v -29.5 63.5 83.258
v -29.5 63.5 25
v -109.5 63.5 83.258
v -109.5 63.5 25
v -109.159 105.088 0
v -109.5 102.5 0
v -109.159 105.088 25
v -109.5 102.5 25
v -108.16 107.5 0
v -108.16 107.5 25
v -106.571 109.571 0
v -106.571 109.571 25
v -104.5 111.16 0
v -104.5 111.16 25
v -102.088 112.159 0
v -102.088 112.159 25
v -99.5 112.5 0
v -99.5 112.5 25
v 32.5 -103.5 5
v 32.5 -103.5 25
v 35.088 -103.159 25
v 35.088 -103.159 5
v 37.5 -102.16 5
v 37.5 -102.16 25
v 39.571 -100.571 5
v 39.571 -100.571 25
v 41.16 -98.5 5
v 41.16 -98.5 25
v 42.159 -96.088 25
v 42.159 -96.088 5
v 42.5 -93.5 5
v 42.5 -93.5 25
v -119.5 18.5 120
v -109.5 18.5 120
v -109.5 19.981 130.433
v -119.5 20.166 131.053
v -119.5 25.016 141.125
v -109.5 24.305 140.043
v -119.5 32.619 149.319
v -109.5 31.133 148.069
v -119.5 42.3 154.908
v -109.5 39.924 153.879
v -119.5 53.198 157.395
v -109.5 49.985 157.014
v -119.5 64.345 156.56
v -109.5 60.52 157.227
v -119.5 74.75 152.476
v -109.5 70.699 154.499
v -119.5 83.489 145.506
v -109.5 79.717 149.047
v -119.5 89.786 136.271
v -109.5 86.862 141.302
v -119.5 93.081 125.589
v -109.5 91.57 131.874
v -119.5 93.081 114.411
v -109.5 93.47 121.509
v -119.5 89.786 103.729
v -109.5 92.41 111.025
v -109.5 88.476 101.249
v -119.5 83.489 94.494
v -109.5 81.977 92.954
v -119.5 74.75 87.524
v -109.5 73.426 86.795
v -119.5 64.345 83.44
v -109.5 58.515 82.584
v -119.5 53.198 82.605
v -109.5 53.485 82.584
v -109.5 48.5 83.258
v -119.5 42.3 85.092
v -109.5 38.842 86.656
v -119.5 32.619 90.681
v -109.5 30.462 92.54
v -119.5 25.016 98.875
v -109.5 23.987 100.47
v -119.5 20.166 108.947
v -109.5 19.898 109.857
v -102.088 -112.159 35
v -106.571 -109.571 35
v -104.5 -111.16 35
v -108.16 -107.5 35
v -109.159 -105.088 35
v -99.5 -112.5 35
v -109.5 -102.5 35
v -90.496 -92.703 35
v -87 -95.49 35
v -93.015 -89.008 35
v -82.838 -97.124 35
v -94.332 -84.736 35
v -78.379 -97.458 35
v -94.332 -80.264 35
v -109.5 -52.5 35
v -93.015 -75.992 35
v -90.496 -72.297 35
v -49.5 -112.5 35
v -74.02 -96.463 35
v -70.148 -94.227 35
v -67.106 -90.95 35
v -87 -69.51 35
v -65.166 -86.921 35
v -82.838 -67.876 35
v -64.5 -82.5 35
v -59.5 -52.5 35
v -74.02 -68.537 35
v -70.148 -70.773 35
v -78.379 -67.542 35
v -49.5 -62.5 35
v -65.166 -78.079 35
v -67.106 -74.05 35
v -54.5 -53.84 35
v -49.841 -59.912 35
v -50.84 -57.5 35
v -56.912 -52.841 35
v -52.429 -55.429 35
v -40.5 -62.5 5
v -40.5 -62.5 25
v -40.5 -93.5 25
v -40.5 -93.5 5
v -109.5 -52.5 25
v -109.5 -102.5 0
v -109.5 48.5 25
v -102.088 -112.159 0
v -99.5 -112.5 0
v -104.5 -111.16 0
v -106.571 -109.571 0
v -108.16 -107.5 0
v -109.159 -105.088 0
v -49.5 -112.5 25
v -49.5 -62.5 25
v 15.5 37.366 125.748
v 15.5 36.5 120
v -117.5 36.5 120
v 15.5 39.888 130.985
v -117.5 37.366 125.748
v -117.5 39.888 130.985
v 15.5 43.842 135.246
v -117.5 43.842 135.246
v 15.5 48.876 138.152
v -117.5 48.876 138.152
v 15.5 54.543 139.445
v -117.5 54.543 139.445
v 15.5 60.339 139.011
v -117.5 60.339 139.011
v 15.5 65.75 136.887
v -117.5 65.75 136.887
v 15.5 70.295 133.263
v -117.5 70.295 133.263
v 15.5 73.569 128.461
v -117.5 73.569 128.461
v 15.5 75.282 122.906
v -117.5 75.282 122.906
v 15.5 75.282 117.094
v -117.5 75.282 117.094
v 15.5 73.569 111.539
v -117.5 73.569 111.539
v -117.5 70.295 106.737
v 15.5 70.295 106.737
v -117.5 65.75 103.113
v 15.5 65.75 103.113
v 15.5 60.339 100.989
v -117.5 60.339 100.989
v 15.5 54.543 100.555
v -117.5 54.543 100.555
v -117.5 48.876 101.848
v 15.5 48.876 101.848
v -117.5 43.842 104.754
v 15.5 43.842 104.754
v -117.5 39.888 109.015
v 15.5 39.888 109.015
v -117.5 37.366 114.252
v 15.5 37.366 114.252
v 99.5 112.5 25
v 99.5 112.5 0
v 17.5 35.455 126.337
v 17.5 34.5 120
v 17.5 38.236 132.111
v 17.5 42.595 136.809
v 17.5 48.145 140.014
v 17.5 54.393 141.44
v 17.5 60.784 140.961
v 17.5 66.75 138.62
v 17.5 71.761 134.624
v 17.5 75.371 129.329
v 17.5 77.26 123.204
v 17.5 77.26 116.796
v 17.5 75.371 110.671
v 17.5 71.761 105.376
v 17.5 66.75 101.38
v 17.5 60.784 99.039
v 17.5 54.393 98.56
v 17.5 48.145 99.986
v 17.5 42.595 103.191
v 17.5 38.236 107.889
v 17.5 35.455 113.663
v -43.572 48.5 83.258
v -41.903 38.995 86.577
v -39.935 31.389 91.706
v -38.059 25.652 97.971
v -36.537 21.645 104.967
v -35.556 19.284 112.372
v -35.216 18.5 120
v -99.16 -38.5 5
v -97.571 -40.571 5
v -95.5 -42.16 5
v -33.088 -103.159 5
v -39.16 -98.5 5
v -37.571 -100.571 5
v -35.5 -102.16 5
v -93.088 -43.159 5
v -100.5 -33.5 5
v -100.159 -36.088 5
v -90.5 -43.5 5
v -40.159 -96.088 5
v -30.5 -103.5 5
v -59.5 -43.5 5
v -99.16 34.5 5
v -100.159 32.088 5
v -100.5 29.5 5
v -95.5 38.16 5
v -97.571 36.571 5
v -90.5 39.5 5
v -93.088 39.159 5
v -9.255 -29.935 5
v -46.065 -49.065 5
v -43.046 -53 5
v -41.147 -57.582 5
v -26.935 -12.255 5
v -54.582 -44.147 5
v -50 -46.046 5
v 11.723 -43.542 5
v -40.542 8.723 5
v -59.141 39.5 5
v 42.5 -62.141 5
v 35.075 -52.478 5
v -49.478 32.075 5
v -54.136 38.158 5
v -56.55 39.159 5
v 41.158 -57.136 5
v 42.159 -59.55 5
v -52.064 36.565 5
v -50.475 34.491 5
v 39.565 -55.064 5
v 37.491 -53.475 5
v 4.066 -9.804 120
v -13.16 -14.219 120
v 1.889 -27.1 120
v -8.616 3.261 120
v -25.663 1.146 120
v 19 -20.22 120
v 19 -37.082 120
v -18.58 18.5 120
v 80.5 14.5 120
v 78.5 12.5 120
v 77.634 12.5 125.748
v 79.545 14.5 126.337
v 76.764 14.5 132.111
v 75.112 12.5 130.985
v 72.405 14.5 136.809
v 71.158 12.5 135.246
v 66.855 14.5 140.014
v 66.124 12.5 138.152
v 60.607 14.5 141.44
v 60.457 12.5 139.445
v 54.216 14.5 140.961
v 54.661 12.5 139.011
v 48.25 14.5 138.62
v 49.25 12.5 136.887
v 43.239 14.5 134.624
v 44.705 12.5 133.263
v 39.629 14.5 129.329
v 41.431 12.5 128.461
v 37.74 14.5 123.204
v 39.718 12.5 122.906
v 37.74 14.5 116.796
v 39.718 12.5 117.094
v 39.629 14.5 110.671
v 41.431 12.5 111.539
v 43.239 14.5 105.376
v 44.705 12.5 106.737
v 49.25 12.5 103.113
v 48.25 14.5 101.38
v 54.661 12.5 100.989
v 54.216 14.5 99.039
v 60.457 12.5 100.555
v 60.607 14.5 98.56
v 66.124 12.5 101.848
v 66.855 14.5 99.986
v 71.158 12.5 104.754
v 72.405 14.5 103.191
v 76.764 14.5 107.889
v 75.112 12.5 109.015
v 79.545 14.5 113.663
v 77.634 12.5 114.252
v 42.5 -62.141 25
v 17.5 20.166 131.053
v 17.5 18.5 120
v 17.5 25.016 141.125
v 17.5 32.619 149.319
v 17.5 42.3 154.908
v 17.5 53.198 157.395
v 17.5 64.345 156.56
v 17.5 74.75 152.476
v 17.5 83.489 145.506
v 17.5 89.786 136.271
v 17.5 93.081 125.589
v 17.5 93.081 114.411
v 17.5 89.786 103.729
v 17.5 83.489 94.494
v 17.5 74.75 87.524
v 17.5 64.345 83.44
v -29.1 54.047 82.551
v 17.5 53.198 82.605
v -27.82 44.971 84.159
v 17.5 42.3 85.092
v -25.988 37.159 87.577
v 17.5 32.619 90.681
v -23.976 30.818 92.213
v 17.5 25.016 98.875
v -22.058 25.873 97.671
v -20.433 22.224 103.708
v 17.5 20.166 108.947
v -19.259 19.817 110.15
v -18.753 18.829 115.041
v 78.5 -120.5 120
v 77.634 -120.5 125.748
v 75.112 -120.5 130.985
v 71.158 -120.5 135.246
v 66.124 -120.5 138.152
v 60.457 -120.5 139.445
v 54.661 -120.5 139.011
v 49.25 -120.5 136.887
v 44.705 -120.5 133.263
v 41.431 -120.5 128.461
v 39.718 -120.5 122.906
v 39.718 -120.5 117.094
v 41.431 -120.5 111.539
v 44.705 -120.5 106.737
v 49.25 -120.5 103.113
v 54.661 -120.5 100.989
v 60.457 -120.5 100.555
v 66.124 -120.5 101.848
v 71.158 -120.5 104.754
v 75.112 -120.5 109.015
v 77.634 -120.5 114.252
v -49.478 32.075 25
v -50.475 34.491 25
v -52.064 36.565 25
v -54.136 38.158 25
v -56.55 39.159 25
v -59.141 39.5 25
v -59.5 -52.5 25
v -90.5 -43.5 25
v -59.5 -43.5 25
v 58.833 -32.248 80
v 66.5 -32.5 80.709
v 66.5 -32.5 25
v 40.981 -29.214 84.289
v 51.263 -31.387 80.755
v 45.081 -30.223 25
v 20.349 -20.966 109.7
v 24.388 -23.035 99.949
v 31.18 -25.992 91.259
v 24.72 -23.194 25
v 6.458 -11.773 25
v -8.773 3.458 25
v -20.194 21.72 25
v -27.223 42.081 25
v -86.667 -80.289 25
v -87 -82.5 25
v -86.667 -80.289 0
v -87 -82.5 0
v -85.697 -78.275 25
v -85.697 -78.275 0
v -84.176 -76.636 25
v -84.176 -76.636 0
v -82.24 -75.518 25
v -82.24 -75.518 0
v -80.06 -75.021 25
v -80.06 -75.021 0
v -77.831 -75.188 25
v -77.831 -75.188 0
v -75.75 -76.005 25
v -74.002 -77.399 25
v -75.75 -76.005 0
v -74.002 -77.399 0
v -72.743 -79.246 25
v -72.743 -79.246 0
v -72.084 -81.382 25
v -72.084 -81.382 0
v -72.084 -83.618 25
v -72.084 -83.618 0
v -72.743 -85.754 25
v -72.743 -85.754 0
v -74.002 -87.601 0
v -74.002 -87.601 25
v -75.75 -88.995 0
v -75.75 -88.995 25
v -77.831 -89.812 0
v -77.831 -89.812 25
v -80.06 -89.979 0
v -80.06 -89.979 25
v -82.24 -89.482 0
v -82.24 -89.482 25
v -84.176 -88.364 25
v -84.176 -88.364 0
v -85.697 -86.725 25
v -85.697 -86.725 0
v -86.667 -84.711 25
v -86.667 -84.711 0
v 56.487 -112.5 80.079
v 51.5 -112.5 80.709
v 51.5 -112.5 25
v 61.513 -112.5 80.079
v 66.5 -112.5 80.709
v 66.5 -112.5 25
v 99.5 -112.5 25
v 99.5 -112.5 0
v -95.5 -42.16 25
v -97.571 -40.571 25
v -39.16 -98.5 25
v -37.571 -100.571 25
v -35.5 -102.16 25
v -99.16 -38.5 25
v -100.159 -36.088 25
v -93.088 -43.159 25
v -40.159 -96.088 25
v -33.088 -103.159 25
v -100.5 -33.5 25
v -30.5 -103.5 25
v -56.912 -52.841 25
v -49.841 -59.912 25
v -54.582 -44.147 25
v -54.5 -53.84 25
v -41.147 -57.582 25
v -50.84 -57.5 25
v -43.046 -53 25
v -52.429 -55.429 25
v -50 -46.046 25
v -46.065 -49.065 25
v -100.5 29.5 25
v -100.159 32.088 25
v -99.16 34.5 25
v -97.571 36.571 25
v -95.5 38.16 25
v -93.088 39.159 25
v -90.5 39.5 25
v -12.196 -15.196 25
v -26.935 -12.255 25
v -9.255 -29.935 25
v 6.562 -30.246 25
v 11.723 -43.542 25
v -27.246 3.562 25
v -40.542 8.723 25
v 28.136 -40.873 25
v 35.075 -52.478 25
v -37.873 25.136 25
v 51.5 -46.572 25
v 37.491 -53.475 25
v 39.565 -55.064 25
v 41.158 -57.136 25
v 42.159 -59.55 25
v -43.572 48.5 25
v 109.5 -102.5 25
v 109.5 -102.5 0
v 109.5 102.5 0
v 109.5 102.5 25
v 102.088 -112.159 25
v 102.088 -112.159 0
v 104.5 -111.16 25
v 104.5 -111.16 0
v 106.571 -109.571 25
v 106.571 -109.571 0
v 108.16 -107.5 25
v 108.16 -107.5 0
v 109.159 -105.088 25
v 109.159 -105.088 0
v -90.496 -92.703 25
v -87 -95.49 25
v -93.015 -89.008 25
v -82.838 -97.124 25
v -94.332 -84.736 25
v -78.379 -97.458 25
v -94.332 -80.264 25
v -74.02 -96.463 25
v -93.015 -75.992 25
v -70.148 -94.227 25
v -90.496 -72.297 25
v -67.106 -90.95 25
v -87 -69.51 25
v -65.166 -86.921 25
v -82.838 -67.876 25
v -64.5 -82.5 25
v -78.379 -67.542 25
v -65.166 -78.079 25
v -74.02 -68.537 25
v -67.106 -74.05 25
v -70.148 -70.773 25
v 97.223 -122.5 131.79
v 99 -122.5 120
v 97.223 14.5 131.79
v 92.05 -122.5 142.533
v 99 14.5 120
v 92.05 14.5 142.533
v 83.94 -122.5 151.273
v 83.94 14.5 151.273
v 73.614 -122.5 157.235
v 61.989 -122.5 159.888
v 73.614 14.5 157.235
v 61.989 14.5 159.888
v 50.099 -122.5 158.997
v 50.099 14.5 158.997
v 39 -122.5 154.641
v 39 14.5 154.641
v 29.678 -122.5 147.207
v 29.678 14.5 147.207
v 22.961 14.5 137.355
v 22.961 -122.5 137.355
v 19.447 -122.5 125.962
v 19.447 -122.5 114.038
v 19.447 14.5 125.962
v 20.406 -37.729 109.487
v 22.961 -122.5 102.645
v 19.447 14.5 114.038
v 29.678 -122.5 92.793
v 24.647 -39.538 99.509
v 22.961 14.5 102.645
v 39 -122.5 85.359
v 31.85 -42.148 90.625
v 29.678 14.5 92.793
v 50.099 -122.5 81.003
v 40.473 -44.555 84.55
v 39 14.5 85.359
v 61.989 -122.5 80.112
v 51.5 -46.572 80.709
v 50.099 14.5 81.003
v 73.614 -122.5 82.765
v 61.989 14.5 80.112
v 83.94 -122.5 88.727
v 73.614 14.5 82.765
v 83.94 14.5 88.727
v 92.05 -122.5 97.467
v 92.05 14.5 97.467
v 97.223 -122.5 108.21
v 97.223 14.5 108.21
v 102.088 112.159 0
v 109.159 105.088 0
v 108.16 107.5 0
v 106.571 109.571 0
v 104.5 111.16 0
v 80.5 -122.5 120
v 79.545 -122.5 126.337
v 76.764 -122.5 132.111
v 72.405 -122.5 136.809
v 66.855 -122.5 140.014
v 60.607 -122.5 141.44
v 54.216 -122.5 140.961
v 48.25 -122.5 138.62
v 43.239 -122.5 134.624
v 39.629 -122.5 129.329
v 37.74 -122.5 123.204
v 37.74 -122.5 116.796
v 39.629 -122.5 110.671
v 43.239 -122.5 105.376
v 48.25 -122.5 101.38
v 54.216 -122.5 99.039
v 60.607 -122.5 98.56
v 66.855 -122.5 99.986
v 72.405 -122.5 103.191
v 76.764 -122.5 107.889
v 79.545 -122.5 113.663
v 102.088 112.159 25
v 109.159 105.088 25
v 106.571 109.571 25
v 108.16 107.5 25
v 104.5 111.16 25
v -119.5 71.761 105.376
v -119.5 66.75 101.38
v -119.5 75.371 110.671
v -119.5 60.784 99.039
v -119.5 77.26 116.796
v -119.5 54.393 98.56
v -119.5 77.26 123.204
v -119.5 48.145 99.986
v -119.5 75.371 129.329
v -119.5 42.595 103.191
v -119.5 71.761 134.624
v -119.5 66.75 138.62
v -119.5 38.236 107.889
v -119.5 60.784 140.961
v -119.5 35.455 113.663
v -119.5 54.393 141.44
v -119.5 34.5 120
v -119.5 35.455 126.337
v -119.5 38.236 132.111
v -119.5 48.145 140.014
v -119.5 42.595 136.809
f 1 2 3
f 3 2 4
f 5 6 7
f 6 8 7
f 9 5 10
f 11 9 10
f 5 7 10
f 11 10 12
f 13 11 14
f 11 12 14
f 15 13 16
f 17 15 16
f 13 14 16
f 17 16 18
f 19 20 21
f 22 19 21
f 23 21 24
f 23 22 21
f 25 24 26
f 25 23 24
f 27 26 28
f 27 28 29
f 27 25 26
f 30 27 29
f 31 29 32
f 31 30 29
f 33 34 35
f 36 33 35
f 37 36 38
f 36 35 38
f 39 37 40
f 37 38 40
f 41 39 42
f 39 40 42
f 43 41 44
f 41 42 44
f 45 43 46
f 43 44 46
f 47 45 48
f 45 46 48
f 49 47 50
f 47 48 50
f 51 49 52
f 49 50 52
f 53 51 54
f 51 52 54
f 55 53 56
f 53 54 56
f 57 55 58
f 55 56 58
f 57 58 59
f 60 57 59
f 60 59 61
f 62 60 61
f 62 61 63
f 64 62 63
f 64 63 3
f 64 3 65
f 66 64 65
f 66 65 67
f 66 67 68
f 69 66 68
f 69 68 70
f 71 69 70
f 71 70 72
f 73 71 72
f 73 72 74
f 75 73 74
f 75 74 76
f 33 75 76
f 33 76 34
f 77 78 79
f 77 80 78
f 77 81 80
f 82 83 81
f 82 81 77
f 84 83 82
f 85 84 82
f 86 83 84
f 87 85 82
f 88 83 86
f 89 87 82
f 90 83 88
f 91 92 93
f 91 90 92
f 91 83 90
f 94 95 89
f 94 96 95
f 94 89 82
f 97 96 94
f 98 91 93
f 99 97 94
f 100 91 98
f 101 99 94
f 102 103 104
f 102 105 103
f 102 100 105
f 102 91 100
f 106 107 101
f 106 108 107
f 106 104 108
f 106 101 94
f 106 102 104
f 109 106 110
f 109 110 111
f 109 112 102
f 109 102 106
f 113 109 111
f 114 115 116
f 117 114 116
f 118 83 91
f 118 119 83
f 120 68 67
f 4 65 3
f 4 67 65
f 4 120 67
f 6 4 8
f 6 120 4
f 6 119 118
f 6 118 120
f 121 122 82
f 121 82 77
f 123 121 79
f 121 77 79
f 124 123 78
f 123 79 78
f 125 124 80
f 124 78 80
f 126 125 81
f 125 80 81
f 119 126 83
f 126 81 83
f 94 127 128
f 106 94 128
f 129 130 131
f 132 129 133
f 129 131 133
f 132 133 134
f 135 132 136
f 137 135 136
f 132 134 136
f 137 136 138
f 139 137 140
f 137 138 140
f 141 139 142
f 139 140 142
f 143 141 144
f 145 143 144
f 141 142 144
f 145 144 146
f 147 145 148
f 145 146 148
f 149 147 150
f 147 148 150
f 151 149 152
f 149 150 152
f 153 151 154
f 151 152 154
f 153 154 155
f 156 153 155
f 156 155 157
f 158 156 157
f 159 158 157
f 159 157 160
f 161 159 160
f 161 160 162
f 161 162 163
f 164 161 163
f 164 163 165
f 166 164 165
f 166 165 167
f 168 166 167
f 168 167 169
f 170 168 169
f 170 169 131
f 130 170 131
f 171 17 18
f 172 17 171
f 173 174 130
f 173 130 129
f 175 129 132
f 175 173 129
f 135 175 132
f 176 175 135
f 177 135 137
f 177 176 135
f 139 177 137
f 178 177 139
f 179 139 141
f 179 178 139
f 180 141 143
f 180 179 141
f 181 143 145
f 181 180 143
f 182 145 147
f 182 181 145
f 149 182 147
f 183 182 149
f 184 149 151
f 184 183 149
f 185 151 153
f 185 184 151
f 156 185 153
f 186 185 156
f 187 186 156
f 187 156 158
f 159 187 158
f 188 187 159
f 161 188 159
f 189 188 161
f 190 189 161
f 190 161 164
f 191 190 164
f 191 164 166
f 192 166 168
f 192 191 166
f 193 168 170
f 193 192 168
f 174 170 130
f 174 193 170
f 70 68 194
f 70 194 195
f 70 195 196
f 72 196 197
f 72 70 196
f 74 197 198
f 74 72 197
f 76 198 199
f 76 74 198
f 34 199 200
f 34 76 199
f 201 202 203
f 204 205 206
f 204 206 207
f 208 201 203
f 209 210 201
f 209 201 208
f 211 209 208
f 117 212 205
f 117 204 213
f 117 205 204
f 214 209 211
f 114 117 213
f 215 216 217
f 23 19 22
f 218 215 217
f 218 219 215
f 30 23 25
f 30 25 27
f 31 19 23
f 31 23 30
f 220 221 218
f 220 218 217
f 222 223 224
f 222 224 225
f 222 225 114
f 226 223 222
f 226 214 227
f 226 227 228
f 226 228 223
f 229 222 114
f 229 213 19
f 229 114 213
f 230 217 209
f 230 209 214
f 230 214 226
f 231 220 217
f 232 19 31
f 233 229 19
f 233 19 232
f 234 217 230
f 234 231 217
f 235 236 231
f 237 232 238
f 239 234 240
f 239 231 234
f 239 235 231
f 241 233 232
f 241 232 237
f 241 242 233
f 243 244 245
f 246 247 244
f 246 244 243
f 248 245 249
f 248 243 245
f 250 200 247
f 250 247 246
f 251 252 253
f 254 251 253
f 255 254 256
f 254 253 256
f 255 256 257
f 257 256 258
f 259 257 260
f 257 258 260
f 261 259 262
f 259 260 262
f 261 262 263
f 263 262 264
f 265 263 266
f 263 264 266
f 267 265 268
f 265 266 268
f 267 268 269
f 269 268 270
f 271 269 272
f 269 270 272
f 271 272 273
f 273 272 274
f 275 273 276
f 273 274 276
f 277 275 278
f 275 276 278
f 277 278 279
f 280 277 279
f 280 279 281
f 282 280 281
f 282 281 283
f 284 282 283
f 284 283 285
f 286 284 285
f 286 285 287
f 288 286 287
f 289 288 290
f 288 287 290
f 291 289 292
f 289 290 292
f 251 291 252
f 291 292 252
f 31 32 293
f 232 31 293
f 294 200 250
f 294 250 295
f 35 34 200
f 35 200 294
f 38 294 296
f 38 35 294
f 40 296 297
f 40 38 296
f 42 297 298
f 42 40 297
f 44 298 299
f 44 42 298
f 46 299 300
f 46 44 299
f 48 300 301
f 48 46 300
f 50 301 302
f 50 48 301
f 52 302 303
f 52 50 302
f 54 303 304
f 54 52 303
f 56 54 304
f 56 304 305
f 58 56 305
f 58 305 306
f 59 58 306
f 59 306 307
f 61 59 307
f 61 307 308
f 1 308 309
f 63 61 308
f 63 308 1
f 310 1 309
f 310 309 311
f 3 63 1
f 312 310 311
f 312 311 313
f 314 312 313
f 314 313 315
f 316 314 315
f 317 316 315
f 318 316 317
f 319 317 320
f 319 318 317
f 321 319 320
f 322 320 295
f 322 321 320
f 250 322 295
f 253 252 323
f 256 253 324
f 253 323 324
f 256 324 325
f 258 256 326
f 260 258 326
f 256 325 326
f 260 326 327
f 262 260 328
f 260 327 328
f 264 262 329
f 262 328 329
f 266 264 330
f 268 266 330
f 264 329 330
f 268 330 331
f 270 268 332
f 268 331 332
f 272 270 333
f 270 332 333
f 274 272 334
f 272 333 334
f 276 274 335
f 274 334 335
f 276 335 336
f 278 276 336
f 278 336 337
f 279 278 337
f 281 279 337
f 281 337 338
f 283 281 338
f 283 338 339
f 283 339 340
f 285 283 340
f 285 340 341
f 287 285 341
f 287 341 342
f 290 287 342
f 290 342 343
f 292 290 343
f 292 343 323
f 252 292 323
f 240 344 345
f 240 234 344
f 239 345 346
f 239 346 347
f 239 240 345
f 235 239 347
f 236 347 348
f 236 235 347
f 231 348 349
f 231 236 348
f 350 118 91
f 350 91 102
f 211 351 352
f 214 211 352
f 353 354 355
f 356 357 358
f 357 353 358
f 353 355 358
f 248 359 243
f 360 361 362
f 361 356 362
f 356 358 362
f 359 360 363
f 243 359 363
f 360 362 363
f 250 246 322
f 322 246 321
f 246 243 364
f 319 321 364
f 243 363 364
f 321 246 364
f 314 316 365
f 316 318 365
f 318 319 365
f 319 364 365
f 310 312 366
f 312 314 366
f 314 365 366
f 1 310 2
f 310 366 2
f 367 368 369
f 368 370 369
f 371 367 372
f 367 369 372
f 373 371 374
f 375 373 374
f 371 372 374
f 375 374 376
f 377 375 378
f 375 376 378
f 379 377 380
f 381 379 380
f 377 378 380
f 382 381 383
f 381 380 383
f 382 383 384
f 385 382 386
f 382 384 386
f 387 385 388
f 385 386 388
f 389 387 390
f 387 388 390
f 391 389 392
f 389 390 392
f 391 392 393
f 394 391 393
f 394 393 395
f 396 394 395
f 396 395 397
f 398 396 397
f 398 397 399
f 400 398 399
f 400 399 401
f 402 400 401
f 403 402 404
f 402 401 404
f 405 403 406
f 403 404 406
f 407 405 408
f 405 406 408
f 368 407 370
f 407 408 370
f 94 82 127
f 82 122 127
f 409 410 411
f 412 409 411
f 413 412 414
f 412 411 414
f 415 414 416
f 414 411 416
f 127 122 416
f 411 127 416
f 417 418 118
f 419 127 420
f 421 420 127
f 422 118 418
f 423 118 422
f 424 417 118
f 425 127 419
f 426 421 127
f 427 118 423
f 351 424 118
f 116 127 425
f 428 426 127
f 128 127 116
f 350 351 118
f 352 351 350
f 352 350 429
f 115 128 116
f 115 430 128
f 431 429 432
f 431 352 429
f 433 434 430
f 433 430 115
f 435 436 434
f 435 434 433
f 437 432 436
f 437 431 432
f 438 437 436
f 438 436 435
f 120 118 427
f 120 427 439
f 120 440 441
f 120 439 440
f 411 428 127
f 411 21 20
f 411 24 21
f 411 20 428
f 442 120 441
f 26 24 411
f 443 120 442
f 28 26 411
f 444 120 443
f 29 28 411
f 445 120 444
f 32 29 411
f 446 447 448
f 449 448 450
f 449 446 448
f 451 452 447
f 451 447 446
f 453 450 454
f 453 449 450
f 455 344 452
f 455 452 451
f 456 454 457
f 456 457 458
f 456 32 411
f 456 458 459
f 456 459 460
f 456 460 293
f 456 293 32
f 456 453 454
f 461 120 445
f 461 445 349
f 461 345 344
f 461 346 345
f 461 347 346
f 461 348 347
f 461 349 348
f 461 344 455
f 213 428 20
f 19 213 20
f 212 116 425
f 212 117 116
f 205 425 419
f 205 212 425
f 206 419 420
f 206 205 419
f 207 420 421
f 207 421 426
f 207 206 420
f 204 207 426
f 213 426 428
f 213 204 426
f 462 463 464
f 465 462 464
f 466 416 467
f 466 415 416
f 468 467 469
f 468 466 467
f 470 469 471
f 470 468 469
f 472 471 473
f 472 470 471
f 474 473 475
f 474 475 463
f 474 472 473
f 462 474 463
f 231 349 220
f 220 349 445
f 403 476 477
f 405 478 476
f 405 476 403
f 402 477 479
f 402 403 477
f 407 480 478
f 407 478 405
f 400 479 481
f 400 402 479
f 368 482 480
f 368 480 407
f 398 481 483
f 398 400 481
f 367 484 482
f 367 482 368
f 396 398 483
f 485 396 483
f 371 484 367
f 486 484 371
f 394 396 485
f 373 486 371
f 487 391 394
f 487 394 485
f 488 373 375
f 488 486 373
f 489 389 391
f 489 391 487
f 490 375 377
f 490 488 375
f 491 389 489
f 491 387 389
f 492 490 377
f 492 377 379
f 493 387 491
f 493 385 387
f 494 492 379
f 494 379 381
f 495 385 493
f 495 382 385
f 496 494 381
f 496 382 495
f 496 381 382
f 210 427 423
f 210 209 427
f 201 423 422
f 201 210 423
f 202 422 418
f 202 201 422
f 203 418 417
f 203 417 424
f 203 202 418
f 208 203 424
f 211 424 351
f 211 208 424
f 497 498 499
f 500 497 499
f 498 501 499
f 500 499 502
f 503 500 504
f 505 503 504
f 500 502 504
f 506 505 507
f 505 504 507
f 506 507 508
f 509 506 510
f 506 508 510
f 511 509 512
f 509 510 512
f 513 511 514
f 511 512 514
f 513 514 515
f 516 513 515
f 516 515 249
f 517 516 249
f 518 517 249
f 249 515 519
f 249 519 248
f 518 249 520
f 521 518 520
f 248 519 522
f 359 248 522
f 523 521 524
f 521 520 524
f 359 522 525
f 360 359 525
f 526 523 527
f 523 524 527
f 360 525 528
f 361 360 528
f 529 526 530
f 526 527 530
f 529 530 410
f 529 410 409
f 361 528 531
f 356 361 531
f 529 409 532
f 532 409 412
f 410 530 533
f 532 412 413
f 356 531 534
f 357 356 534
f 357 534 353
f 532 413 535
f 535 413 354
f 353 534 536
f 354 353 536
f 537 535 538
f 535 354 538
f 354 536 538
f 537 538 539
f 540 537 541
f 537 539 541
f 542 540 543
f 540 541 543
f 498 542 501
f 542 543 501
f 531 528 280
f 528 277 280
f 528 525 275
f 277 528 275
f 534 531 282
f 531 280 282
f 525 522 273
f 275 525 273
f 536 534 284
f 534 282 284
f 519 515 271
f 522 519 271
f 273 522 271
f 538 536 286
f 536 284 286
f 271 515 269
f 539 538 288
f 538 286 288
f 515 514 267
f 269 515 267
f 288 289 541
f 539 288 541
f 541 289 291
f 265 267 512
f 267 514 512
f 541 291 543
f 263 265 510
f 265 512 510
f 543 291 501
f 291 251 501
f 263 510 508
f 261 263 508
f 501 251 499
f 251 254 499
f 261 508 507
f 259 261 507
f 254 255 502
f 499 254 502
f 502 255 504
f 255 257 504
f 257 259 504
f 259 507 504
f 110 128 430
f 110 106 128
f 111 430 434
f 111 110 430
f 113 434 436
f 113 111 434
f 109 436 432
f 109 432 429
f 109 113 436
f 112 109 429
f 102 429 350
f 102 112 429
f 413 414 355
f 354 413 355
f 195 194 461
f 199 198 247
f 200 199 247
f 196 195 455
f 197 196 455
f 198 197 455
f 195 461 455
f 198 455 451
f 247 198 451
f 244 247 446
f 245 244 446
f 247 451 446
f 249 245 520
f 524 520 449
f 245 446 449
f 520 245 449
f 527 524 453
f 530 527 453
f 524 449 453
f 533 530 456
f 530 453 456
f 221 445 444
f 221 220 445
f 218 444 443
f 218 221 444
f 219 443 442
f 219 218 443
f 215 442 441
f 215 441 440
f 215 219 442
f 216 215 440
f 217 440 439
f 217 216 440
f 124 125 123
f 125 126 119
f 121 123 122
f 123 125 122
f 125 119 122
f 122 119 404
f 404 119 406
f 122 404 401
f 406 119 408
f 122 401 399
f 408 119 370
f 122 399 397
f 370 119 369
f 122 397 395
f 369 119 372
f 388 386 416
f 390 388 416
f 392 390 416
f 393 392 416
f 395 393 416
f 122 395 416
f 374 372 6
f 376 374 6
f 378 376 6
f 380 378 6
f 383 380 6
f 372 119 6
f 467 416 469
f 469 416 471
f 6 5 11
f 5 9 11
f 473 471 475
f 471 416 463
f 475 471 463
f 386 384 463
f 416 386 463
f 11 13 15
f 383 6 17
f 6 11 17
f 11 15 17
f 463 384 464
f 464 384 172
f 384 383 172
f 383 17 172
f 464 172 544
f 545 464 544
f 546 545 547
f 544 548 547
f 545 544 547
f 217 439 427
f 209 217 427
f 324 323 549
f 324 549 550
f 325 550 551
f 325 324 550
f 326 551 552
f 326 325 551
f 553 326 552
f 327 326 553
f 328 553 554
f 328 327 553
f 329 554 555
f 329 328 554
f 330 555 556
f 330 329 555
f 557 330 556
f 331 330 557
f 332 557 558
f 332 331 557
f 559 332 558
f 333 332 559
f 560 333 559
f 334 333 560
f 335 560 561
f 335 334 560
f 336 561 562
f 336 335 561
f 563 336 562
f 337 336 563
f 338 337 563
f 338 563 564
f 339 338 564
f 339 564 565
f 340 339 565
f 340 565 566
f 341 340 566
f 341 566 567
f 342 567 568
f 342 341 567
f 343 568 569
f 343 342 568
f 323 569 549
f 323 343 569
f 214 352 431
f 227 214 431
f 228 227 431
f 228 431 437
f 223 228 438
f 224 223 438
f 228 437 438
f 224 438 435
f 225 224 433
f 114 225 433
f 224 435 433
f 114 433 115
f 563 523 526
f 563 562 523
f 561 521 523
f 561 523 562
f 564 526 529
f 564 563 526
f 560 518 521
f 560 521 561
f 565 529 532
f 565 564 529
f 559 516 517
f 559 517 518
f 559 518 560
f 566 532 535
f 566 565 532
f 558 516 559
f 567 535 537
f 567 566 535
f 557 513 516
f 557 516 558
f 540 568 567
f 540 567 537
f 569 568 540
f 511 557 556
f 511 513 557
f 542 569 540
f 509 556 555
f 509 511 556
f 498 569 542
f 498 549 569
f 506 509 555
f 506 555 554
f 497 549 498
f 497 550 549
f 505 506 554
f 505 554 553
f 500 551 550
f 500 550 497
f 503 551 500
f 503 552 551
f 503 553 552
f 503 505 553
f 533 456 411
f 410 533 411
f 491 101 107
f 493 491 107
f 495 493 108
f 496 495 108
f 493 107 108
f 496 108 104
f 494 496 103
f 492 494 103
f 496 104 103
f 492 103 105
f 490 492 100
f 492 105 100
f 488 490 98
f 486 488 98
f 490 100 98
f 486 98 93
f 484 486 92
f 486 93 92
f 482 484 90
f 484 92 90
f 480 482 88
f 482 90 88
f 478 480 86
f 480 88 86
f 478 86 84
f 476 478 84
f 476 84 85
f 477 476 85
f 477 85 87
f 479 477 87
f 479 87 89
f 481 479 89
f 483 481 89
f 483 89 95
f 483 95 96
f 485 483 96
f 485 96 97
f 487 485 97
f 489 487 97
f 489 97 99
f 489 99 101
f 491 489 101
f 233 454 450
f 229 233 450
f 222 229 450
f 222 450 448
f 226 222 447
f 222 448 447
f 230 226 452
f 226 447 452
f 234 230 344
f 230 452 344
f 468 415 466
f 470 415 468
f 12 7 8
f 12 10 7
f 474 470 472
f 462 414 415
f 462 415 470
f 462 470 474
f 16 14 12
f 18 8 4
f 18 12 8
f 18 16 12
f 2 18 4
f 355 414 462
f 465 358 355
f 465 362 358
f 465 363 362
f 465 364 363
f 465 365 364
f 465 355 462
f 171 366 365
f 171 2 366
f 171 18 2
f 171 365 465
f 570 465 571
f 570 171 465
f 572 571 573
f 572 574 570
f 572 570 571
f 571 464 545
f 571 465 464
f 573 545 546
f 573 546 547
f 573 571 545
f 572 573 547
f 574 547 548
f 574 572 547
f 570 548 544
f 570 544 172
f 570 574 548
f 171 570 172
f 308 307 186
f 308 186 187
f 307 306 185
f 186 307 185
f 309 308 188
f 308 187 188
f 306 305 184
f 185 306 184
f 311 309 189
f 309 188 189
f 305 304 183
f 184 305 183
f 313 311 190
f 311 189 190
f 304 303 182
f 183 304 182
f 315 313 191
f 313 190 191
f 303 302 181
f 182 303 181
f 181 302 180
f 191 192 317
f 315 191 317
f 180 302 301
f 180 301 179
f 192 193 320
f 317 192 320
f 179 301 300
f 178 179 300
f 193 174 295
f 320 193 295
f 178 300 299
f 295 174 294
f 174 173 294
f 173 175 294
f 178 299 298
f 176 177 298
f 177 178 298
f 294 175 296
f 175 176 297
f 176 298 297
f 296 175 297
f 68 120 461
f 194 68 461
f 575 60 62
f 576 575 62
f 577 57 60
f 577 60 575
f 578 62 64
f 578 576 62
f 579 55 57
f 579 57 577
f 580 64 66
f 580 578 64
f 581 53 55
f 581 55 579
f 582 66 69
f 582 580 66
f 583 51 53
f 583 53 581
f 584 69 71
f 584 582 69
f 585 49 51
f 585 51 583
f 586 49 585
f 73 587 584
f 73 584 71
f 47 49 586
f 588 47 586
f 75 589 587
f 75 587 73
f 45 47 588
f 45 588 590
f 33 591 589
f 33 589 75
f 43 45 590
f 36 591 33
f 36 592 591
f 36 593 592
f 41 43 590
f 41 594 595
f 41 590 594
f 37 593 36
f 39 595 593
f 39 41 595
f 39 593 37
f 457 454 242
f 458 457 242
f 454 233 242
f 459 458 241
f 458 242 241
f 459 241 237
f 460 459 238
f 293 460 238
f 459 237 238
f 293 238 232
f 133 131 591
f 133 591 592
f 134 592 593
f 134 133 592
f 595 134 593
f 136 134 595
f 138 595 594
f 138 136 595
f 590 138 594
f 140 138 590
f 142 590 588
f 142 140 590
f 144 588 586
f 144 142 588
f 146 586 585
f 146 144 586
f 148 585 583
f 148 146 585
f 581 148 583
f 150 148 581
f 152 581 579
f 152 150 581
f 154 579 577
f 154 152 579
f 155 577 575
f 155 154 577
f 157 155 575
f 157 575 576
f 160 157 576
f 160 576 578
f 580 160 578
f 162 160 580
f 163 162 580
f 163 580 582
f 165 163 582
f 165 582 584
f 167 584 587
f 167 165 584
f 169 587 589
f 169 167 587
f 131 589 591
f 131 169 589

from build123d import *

# Parameters (mm, degrees)
F0_W            = 219
F0_H            = 225
F1_DEPTH        = 25
F3_DEPTH        = 95
F4_R            = 37.5
F5_DEPTH        = 10
F5_DEPTH_BACK   = 127
F6_R            = 40
F7_DEPTH        = 10
F7_DEPTH_BACK   = 127
F8_W            = 60
F8_H            = 60
F9_DEPTH        = 10
F10_R           = 10
F12_DEPTH       = 20
F14_D           = 15
F14_CBORE_D     = 30
F14_CBORE_DEPTH = 10
F15_R           = 10
F16_R           = 19.5
F17_DEPTH       = 229.001
F18_R           = 19.5
F19_DEPTH       = 235.001
F20_SIZE        = 2
F21_R           = 10


with BuildPart() as f1:
    # F0 (on Top) → F1 (new body)
    with BuildSketch(Plane.XY):
        Rectangle(F0_W, F0_H)
    extrude(amount=F1_DEPTH)

    # F2 (on face) → F3 (join)
    with BuildSketch(Plane.XY.offset(25)):
        with BuildLine():
            Line((-29.5, 63.5), (-109.5, 63.5))
            Line((-109.5, 63.5), (-109.5, 48.5))
            Line((-109.5, 48.5), (-43.571649, 48.5))
            ThreePointArc((-43.571649, 48.5), (-12.195597, -15.195597), (51.5, -46.571649))
            Line((51.5, -46.571649), (51.5, -112.5))
            Line((51.5, -112.5), (66.5, -112.5))
            Line((66.5, -112.5), (66.5, -32.5))
            ThreePointArc((66.5, -32.5), (-1.588995, -4.588995), (-29.5, 63.5))
        make_face()
    extrude(amount=F3_DEPTH)

    # F4 (on face) → F5 (join, two sides)
    with BuildSketch(Plane(origin=(-109.5, 0, 0), x_dir=(0, -1, 0), z_dir=(-1, 0, 0))) as f5_sk:
        with Locations((-56, 120)):
            Circle(F4_R)
    extrude(amount=F5_DEPTH)
    extrude(f5_sk.sketch, amount=-F5_DEPTH_BACK)

    # F6 (on face) → F7 (join, two sides)
    with BuildSketch(Plane.XZ.offset(112.5)) as f7_sk:
        with Locations((59, 120)):
            Circle(F6_R)
    extrude(amount=F7_DEPTH)
    extrude(f7_sk.sketch, amount=-F7_DEPTH_BACK)

    # F8 (on face) → F9 (join)
    with BuildSketch(Plane.XY.offset(25)):
        with Locations((-79.5, -82.5)):
            Rectangle(F8_W, F8_H)
    extrude(amount=F9_DEPTH)

    # F10
    f10_edges = [f1.edges().sort_by_distance(p)[0] for p in [
        (-49.5, -52.5, 30),
    ]]
    fillet(f10_edges, radius=F10_R)

    # F11 (on face) → F12 (cut)
    with BuildSketch(Plane.XY.offset(25)):
        with BuildLine():
            ThreePointArc((42.5, -54.205123), (-18.559558, -21.559558), (-51.205123, 39.5))
            Line((-51.205123, 39.5), (-100.5, 39.5))
            Line((-100.5, 39.5), (-100.5, -43.5))
            Line((-100.5, -43.5), (-59.5, -43.5))
            ThreePointArc((-59.5, -43.5), (-46.064971, -49.064971), (-40.5, -62.5))
            Line((-40.5, -62.5), (-40.5, -103.5))
            Line((-40.5, -103.5), (42.5, -103.5))
            Line((42.5, -103.5), (42.5, -54.205123))
        make_face()
    extrude(amount=-F12_DEPTH, mode=Mode.SUBTRACT)

    # F14 (through all)
    with Locations(Plane.XY.offset(35)):
        with Locations((-79.5, -82.5)):
            CounterBoreHole(F14_D / 2, F14_CBORE_D / 2, F14_CBORE_DEPTH)

    # F15
    f15_edges = [f1.edges().sort_by_distance(p)[0] for p in [
        (42.5, -54.205123, 15),
        (-51.205123, 39.5, 15),
        (42.5, -103.5, 15),
        (-40.5, -103.5, 15),
        (-100.5, 39.5, 15),
        (-100.5, -43.5, 15),
    ]]
    fillet(f15_edges, radius=F15_R)

    # F16 (on face) → F17 (cut, through all)
    with BuildSketch(Plane(origin=(-119.5, 0, 0), x_dir=(0, -1, 0), z_dir=(-1, 0, 0))):
        with Locations((-56, 120)):
            Circle(F16_R)
    extrude(amount=-F17_DEPTH, mode=Mode.SUBTRACT)

    # F18 (on face) → F19 (cut, through all)
    with BuildSketch(Plane.XZ.offset(122.5)):
        with Locations((59, 120)):
            Circle(F18_R)
    extrude(amount=-F19_DEPTH, mode=Mode.SUBTRACT)

    # F20
    f20_edges = [f1.edges().sort_by_distance(p)[0] for p in [
        (-119.5, 75.5, 120),
        (39.5, -122.5, 120),
        (39.5, 14.5, 120),
        (17.5, 75.5, 120),
    ]]
    chamfer(f20_edges, length=F20_SIZE)

    # F21
    f21_edges = [f1.edges().sort_by_distance(p)[0] for p in [
        (-109.5, -112.5, 17.5),
        (109.5, -112.5, 12.5),
        (109.5, 112.5, 12.5),
        (-109.5, 112.5, 12.5),
    ]]
    fillet(f21_edges, radius=F21_R)


solid = f1.part
